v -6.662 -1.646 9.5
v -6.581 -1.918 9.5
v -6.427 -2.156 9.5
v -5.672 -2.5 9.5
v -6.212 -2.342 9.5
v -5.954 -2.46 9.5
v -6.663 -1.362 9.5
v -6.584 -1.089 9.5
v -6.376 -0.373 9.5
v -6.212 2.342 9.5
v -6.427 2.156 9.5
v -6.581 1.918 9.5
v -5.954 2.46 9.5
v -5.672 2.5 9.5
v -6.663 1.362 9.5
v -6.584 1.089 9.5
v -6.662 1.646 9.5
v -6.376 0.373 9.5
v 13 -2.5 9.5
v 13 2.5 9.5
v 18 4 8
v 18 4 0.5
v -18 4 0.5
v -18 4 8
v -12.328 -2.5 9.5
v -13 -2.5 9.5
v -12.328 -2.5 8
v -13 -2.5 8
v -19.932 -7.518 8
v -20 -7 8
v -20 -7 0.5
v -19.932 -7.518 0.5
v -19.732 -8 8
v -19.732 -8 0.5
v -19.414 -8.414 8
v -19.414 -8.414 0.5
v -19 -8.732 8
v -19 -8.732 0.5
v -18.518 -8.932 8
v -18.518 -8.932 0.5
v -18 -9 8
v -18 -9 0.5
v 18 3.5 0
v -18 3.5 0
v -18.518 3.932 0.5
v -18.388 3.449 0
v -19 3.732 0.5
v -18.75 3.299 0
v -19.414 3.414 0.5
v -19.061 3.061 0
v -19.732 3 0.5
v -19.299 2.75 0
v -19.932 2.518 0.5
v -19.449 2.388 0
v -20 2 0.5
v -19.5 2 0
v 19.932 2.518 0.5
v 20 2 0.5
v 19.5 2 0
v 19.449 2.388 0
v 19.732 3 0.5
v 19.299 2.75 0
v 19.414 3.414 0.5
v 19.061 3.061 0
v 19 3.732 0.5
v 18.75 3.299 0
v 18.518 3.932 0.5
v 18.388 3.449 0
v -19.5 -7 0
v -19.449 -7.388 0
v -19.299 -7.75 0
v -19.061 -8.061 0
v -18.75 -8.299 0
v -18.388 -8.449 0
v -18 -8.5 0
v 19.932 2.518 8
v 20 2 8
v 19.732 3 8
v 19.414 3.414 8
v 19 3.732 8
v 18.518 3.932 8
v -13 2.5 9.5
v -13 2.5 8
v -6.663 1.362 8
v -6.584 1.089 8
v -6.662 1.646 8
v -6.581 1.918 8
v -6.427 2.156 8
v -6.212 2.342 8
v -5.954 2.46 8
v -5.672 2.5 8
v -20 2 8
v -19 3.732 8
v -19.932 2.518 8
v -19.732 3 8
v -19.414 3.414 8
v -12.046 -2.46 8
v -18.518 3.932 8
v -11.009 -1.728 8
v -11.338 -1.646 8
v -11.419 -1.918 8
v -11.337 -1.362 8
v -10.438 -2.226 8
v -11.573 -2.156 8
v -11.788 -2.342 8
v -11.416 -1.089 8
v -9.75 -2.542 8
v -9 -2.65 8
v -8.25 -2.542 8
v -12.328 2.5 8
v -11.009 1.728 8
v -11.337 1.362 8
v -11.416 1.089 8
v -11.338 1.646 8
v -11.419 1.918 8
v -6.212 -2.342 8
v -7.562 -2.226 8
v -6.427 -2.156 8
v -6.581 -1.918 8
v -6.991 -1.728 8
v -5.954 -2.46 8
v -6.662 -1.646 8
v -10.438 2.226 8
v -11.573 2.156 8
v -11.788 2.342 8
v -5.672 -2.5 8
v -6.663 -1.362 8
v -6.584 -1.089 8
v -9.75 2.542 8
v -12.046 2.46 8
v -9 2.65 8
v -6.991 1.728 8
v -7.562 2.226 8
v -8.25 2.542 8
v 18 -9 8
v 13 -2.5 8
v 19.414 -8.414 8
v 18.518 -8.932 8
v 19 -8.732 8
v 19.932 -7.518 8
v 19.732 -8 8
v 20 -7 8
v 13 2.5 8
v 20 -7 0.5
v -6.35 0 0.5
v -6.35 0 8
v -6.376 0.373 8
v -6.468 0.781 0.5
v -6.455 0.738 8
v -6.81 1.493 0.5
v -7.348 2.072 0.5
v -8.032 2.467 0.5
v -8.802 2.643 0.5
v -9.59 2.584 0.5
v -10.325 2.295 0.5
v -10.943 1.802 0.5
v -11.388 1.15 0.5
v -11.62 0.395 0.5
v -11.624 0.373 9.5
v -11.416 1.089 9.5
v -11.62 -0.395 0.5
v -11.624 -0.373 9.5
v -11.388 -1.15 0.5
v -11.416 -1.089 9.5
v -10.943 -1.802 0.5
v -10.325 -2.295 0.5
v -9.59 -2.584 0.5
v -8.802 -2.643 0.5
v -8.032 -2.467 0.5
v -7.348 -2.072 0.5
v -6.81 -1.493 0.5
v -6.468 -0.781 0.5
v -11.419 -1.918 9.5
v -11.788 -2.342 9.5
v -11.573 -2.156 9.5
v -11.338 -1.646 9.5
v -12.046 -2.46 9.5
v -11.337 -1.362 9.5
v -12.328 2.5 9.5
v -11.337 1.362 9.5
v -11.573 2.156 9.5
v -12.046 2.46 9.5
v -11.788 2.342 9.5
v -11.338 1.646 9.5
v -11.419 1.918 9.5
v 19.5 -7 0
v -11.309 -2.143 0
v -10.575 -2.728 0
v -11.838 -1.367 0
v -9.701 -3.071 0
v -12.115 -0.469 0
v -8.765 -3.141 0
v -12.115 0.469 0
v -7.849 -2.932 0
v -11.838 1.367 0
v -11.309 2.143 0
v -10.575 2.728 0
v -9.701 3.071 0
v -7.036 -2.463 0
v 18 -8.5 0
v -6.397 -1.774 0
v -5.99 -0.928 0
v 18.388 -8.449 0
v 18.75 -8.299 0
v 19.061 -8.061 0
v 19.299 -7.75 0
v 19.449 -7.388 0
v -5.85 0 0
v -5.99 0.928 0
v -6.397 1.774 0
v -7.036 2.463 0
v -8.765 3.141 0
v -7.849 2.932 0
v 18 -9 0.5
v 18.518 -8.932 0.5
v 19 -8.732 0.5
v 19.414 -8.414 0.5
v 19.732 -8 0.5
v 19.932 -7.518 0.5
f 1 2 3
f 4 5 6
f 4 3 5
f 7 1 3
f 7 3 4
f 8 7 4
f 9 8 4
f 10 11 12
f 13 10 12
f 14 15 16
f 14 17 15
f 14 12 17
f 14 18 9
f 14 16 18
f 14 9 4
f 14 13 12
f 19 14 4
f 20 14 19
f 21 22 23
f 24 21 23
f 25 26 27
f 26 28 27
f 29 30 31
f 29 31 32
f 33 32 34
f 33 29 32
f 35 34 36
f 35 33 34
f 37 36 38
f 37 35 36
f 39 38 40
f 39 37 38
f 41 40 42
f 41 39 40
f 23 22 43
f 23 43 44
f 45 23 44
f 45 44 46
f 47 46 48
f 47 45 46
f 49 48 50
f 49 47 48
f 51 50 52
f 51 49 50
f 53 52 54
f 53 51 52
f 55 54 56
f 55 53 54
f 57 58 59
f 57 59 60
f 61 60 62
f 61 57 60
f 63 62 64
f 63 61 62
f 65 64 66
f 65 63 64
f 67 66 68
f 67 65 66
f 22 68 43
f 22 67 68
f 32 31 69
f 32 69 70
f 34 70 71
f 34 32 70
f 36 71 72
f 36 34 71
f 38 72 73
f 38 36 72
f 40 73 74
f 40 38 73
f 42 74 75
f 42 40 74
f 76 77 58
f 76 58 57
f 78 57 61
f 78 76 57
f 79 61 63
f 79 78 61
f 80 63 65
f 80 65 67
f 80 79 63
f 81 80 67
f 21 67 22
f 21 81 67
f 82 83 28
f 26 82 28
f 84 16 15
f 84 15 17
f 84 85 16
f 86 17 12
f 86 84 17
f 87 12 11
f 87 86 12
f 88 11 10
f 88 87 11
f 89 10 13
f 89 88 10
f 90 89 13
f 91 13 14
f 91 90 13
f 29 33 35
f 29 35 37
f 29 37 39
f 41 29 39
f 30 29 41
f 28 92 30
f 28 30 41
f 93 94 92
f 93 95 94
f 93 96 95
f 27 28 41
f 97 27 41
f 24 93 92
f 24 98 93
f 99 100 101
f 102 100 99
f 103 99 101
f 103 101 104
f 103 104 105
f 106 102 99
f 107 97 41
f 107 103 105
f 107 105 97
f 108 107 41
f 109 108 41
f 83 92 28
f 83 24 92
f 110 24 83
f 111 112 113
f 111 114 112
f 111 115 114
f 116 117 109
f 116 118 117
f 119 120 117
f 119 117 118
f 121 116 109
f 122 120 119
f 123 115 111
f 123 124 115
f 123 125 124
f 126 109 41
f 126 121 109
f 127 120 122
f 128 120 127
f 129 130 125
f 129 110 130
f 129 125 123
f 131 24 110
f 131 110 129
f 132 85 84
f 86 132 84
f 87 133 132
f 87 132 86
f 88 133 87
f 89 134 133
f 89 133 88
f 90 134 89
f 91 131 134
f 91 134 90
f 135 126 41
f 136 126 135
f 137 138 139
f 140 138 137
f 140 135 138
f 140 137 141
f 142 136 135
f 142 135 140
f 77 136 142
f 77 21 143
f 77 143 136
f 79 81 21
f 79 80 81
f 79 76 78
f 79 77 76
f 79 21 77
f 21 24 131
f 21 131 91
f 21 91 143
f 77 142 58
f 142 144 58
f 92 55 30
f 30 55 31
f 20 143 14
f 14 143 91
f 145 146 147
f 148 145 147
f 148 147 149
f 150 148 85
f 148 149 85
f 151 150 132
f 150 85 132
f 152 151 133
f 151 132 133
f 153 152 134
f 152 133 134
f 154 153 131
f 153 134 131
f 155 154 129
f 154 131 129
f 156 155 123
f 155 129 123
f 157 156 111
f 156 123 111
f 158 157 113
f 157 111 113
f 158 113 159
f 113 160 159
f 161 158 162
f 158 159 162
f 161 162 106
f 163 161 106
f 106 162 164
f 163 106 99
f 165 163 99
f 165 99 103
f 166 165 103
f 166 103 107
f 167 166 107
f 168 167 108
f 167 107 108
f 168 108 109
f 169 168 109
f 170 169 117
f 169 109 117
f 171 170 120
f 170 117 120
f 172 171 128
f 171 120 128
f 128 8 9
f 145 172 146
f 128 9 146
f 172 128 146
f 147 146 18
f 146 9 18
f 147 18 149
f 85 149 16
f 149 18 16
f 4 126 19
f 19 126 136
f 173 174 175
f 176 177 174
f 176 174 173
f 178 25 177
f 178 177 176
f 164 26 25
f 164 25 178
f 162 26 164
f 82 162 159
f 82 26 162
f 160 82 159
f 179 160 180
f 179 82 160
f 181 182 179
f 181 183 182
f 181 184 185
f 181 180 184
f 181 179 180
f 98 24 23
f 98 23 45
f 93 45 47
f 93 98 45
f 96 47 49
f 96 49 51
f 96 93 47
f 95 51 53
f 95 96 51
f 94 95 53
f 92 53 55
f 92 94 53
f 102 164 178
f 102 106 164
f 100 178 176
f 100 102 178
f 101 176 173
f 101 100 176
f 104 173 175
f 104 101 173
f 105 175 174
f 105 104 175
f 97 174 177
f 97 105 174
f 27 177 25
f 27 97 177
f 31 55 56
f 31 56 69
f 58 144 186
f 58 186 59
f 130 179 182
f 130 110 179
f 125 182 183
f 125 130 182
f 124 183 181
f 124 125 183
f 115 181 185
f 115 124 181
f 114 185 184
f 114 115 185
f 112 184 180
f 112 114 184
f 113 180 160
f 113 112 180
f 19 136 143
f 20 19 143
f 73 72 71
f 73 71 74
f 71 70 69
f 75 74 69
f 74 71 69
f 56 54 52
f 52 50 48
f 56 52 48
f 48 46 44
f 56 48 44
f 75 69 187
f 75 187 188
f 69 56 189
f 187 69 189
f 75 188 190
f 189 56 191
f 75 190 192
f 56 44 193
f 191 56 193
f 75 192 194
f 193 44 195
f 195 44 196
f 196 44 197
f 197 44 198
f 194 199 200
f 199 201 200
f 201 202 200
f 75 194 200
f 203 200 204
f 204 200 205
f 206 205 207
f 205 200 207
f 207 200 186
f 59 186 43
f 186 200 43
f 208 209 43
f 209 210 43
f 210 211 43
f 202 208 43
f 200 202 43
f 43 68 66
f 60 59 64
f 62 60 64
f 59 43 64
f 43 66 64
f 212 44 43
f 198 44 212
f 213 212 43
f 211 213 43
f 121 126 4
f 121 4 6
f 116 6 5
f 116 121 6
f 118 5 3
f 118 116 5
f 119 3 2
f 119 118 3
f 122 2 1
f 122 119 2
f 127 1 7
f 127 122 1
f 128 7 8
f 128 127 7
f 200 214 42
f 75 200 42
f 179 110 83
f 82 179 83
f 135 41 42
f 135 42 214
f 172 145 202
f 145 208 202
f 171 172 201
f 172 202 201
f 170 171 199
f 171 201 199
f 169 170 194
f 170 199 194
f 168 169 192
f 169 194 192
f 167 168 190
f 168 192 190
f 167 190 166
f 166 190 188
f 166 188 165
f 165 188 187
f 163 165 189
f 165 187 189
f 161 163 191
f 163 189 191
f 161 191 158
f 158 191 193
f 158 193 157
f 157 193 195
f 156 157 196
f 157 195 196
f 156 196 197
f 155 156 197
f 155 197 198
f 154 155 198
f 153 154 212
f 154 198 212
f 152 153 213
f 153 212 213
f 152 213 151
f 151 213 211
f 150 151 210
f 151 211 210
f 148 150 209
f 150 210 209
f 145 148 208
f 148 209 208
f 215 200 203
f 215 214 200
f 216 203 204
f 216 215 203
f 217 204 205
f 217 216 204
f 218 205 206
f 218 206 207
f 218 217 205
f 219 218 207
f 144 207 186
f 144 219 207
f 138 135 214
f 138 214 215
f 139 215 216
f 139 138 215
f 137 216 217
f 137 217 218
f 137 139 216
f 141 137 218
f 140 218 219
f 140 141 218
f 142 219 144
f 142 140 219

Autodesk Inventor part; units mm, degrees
ref_plane "YZ Plane" through (0, 0, 0) normal (1, 0, 0) x (0, 1, 0)
ref_plane "XZ Plane" through (0, 0, 0) normal (0, 1, 0) x (-1, 0, 0)
ref_plane "XY Plane" through (0, 0, 0) normal (0, 0, 1) x (1, 0, 0)
sketch "Sketch1" plane through (0, 0, 0) normal (0, 0, 1) x (1, 0, 0)
  line L0 (-20, -4) -> (20, -4)
  line L1 (20, -4) -> (20, 4)
  line L2 (20, 4) -> (-20, 4)
  line L3 (-20, 4) -> (-20, -4)
  line L4 (-20, -4) -> (20, 4) construction
  line L5 (20, -4) -> (-20, 4) construction
  point P0 (0, 0)
  dimension "d0" = 8
  dimension "d1" = 40
extrude "Extrusion1" add sketch "Sketch1" along normal blind 8
sketch "Sketch2" plane through (-20, -4, 0) normal (0, -1, 0) x (1, 0, 0)
  line L0 (0, 0) -> (40, 0) projected
  line L1 (40, 0) -> (40, 8) projected
  line L2 (0, 8) -> (40, 8) projected
  line L3 (0, 0) -> (0, 8) projected
  point P0 (20, 0)
extrude "Extrusion2" add sketch "Sketch2" along normal blind 5
sketch "Sketch3" plane through (0, 0, 8) normal (0, 0, 1) x (1, 0, 0)
  line L0 (-15, -3) -> (15, -3) construction
  line L1 (15, -3) -> (15, 3) construction
  line L2 (15, 3) -> (-15, 3) construction
  line L3 (-15, 3) -> (-15, -3) construction
  line L4 (-15, -3) -> (15, 3) construction
  line L5 (15, -3) -> (-15, 3) construction
  line L6 (-28, 0) -> (28, 0) projected
  circle A0 centre (-9, 0) radius 2.65
  point P0 (0, 0)
  dimension "d6" = 6
  dimension "d7" = 30
  dimension "d8" = 5.3
extrude "Extrusion3" cut sketch "Sketch3" against normal through all
sketch "Sketch4" plane through (0, 0, 8) normal (0, 0, 1) x (1, 0, 0)
  line L0 (-13, -2.5) -> (13, -2.5)
  line L1 (13, -2.5) -> (13, 2.5)
  line L2 (13, 2.5) -> (-13, 2.5)
  line L3 (-13, 2.5) -> (-13, -2.5)
  line L4 (-13, -2.5) -> (13, 2.5) construction
  line L5 (13, -2.5) -> (-13, 2.5) construction
  circle A0 centre (-9, 0) radius 2.65 projected
  point P0 (0, 0)
  point P1 (-8.1211, 2.5)
  point P2 (-8.1211, -2.5)
  point P3 (-9.8789, -2.5)
  point P4 (-9.8789, 2.5)
  dimension "d11" = 26
  dimension "d12" = 5
extrude "Extrusion4" add sketch "Sketch4" along normal blind 1.5 contours L3 L2 A0 L0 | A0 L2 L1 L0
fillet "Fillet1" radius 1 4 edges at (-9.8789, -2.5, 8.75) (-9.8789, 2.5, 8.75) (-8.1211, -2.5, 8.75) (-8.1211, 2.5, 8.75)
fillet "Fillet2" radius 2 4 edges at (-20, -9, 4) (-20, 4, 4) (20, -9, 4) (20, 4, 4)
chamfer "Chamfer1" distance 0.5 angle 45 9 edges at (0, -9, 0) (19.4142, -8.4142, 0) (20, -2.5, 0) (19.4142, 3.4142, 0) (0, 4, 0) (-19.4142, 3.4142, 0) (-20, -2.5, 0) (-19.4142, -8.4142, 0) (-11.65, 0, 0)
properties part number "SideHolderFix1"
